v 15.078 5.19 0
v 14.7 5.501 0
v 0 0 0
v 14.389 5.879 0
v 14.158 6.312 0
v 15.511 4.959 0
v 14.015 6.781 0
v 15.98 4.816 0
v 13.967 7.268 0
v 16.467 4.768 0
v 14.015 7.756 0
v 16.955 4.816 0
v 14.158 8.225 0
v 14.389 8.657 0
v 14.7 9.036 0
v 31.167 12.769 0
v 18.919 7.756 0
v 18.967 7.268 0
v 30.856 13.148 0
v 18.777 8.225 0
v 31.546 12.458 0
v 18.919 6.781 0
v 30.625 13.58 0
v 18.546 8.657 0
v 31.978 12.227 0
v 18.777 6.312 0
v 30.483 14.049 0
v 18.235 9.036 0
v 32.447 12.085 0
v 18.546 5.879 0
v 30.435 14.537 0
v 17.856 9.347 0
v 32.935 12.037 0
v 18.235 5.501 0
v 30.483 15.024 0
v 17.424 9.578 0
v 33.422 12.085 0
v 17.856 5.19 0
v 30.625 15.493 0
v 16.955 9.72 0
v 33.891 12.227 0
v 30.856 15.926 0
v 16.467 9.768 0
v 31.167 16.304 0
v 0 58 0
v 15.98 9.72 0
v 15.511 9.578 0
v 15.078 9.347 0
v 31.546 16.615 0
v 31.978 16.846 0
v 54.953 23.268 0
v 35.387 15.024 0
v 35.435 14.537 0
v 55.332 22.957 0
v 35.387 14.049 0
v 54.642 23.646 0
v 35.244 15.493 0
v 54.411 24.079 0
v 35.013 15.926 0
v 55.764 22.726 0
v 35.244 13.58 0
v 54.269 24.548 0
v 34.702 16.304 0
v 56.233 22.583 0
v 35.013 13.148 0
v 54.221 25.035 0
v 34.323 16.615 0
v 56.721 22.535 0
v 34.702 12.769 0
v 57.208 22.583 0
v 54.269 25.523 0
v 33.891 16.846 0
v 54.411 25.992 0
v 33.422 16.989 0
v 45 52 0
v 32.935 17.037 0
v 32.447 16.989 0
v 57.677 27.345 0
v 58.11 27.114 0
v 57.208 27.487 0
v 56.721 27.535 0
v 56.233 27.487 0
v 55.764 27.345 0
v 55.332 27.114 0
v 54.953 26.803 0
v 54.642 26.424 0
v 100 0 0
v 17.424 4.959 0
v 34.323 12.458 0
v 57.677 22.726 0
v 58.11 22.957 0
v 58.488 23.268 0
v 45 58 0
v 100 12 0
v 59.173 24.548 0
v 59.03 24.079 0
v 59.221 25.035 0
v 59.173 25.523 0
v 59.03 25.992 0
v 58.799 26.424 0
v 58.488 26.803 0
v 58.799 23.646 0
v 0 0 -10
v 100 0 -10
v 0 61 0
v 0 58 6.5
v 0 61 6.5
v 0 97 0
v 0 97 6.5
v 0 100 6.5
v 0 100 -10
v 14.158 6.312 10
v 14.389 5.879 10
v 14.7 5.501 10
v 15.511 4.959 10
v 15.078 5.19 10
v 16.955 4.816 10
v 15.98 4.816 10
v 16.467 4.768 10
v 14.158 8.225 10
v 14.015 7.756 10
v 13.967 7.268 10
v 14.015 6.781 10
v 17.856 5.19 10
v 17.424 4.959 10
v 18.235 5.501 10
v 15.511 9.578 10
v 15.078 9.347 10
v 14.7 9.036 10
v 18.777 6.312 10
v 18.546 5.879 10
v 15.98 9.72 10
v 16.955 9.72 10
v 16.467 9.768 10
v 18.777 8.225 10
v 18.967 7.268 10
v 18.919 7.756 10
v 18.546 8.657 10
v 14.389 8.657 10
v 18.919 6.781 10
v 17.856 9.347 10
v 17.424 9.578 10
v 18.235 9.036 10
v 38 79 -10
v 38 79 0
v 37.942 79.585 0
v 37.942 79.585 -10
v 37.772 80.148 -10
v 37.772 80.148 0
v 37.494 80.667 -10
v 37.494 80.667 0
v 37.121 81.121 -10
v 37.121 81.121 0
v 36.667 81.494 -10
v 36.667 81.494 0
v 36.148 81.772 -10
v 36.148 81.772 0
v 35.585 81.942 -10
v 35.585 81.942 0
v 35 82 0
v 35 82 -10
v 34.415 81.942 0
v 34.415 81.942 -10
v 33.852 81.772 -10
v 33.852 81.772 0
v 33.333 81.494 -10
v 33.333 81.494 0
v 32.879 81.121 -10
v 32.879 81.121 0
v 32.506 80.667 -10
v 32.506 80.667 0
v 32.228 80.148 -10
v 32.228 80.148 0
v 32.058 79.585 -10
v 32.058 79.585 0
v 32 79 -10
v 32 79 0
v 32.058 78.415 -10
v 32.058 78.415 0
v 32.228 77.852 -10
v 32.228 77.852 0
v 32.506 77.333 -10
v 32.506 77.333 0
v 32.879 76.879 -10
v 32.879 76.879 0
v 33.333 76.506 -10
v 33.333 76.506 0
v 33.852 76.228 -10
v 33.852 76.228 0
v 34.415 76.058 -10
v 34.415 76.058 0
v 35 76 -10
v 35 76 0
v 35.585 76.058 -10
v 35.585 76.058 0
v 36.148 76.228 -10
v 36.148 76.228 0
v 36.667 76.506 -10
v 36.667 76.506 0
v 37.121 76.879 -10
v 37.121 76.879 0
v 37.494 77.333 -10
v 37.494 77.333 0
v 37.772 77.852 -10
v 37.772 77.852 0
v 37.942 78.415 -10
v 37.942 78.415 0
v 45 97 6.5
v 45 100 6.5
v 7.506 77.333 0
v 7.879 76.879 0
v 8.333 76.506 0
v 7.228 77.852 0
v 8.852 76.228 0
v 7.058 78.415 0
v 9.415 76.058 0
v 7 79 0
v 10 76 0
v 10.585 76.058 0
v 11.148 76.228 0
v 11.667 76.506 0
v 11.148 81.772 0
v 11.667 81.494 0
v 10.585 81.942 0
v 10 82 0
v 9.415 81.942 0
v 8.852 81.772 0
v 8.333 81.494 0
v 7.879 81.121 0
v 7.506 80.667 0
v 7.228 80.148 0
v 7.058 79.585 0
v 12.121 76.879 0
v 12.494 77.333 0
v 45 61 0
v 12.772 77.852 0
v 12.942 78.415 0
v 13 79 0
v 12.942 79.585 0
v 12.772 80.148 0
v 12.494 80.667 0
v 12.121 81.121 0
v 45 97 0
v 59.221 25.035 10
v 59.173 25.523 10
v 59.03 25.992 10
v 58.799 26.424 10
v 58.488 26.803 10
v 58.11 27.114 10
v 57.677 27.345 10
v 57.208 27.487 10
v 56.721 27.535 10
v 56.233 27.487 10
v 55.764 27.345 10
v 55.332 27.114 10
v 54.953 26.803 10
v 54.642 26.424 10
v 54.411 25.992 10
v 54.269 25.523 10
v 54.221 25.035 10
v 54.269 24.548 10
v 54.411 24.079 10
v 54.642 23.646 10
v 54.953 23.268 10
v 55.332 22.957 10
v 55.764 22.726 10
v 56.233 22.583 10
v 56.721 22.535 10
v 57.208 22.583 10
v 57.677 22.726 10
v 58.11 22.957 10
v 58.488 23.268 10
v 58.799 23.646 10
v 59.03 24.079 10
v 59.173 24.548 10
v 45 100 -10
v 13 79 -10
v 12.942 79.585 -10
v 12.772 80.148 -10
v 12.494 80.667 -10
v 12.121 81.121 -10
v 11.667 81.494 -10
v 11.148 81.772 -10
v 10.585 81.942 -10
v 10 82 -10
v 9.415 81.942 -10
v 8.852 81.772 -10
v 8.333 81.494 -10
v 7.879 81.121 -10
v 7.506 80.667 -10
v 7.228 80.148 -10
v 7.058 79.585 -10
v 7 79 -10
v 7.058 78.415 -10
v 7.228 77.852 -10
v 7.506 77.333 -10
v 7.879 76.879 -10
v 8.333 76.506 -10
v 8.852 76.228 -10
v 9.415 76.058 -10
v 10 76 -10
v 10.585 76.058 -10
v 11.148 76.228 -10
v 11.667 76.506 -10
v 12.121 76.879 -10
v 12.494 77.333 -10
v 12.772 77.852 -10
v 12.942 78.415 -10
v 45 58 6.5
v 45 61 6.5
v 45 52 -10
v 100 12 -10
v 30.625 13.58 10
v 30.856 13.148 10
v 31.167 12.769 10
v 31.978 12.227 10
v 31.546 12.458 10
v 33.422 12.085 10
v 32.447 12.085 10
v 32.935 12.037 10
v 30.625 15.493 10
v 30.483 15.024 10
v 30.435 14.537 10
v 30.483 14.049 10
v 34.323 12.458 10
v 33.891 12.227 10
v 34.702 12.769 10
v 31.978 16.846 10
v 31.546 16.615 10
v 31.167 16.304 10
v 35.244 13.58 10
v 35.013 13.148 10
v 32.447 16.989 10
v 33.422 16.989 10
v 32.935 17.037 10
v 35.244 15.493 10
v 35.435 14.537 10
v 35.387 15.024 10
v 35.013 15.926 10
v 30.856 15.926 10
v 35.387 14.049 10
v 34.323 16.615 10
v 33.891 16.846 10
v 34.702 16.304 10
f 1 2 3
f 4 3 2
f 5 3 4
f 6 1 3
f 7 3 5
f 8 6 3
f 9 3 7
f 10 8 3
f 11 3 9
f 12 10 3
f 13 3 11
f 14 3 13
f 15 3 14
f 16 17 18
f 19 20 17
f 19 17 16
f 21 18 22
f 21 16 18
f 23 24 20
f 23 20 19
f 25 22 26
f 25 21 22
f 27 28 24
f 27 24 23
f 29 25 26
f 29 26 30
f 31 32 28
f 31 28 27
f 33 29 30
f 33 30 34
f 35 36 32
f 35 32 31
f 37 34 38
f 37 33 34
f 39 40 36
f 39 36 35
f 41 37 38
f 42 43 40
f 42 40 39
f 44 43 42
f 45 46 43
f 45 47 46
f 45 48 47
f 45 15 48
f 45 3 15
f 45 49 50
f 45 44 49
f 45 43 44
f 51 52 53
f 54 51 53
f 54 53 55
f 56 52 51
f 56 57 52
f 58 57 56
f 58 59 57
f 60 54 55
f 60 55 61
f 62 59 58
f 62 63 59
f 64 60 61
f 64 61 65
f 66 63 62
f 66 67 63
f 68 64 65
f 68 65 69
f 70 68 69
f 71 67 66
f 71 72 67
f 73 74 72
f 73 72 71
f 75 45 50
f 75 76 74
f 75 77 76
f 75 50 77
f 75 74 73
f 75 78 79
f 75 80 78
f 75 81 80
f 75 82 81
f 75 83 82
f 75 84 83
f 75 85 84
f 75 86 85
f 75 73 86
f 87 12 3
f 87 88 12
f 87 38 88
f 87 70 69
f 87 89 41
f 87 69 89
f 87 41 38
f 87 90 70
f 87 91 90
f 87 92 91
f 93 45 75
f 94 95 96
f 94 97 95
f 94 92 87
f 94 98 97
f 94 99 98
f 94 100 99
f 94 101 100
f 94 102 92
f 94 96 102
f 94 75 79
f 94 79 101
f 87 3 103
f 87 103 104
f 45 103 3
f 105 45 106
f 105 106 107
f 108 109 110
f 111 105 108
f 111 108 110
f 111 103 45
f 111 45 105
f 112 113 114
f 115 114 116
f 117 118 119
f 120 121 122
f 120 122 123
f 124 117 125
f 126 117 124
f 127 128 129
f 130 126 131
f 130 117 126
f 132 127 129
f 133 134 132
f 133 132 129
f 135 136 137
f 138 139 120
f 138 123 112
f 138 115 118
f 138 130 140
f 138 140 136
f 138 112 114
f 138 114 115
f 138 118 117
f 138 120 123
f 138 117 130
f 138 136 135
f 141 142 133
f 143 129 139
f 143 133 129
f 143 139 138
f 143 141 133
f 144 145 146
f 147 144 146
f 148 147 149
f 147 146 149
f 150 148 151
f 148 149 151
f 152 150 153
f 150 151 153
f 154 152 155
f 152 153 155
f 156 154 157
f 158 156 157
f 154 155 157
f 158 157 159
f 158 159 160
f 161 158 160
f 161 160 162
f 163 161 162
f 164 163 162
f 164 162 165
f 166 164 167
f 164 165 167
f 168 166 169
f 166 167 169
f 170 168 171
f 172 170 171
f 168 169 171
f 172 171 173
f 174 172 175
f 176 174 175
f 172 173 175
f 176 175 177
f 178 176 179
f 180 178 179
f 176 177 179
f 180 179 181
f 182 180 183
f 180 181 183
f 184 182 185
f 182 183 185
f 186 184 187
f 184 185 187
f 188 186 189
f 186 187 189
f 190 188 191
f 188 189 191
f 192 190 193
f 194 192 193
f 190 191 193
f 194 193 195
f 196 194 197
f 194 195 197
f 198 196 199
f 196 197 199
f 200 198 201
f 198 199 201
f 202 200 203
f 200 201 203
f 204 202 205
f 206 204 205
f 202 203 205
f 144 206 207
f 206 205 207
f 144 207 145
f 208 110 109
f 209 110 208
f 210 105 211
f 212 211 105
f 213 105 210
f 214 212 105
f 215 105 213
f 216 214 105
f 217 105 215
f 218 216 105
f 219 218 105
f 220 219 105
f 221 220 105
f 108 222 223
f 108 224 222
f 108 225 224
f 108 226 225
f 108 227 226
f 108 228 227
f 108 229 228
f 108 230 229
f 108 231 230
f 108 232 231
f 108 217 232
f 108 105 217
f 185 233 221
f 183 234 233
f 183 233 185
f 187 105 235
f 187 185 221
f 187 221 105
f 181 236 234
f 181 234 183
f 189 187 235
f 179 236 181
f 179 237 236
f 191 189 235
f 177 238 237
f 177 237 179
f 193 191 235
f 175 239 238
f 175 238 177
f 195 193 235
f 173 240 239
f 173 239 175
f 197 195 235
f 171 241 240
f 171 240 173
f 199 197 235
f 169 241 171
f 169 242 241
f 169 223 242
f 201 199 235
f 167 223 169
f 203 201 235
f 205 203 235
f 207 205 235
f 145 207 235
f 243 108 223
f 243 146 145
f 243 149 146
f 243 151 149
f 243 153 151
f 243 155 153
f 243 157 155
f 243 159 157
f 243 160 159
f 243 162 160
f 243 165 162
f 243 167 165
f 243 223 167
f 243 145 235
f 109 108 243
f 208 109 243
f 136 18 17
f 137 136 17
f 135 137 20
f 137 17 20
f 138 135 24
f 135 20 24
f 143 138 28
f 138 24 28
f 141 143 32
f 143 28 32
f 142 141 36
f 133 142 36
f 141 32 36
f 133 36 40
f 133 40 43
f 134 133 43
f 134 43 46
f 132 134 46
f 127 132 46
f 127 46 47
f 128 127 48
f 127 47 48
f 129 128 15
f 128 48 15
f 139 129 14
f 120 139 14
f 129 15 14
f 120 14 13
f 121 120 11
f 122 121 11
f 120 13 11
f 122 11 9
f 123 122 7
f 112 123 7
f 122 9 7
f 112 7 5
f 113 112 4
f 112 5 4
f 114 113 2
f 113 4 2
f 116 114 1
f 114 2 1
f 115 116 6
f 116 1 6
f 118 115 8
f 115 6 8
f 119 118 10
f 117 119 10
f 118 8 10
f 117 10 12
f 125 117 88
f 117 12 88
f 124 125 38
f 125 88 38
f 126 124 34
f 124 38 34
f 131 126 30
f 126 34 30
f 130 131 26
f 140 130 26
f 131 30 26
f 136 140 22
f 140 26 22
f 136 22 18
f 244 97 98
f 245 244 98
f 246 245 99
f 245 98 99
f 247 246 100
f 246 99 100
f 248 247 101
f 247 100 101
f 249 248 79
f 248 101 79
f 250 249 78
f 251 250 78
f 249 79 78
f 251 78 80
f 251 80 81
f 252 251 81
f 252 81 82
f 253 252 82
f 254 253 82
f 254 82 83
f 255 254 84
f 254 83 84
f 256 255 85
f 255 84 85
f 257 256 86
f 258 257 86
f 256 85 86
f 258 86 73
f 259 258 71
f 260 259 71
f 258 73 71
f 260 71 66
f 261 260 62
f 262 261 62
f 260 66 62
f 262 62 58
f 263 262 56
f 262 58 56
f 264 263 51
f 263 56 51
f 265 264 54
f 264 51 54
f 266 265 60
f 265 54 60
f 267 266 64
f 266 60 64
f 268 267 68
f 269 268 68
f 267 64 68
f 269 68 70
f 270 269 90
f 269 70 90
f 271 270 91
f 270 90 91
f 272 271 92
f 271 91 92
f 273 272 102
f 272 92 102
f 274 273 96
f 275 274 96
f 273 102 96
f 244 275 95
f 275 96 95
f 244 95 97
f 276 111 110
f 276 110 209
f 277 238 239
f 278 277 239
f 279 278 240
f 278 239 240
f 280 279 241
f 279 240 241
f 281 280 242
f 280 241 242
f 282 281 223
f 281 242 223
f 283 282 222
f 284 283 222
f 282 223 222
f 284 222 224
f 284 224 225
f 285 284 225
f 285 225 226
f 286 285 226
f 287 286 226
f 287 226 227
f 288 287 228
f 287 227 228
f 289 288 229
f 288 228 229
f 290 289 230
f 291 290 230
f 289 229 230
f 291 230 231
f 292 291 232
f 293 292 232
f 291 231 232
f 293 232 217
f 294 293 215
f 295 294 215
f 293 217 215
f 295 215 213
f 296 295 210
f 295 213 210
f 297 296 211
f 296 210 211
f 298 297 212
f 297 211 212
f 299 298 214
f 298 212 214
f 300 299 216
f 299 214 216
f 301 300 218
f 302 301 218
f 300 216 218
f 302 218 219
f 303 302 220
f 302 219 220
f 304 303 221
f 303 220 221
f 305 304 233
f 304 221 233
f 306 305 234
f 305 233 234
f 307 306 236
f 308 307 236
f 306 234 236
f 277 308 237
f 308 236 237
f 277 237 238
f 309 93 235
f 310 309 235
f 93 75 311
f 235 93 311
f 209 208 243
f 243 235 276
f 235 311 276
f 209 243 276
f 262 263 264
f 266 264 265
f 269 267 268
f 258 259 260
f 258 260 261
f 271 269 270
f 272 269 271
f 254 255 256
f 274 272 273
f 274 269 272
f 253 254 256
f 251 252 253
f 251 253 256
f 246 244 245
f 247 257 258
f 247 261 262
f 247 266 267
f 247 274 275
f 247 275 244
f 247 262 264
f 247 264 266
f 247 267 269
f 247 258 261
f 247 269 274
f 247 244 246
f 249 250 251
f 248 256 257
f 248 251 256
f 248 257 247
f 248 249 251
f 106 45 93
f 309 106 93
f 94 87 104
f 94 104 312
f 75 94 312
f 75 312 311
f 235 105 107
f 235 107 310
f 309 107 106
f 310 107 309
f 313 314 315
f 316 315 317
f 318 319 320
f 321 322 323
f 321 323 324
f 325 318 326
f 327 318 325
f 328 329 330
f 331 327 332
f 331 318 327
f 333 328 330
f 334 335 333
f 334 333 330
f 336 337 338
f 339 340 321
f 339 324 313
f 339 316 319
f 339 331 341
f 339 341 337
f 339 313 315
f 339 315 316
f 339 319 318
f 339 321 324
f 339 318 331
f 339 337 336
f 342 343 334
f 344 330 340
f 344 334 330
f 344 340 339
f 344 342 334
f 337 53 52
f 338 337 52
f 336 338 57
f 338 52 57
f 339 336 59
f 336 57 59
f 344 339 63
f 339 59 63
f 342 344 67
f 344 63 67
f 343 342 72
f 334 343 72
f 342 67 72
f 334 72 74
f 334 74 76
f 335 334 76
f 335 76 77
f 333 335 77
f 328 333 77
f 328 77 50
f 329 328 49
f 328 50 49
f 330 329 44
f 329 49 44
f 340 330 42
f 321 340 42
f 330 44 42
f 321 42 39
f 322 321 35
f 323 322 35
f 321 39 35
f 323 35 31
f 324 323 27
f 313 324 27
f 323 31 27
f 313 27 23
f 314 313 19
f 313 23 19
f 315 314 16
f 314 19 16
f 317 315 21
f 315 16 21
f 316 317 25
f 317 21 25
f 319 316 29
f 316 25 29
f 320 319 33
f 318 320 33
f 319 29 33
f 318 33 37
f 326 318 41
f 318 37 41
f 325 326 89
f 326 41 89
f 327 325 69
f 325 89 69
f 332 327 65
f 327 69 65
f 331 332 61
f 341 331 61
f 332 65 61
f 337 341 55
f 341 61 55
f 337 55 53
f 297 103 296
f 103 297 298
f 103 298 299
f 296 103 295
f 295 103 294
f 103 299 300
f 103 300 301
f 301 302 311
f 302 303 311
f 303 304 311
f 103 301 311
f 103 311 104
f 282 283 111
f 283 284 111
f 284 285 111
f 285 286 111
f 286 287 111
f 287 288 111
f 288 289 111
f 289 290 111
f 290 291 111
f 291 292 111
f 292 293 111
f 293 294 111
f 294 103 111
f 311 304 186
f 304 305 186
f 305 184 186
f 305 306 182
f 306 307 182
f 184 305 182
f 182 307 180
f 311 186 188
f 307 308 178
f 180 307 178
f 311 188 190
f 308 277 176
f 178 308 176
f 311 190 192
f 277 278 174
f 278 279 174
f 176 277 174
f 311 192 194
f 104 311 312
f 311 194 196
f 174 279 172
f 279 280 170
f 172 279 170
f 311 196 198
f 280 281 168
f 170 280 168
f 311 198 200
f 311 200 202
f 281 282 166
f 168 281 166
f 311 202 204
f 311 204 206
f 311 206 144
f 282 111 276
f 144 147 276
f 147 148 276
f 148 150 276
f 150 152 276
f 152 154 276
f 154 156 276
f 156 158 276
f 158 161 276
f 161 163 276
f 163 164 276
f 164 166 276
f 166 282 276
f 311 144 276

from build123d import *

# Parameters (mm, degrees)
BOSS_EXTRUDE1_DEPTH = 10
SKETCH3_W           = 45
SKETCH3_H           = 3
BOSS_EXTRUDE2_DEPTH = 6.5
SKETCH4_R           = 3
CUT_EXTRUDE2_DEPTH  = 10
SKETCH5_R           = 2.5
BOSS_EXTRUDE3_DEPTH = 10


with BuildPart() as part:
    # Sketch2 → Boss-Extrude1 (new body)
    with BuildSketch(Plane.XY):
        Polygon((0, 0), (100, 0), (100, 12), (45, 52), (45, 100), (0, 100), align=None)
    extrude(amount=-BOSS_EXTRUDE1_DEPTH)

    # Sketch3 → Boss-Extrude2 (add)
    with BuildSketch(Plane.XY):
        with Locations((22.5, 98.5)):
            Rectangle(SKETCH3_W, SKETCH3_H)
        with Locations((22.5, 59.5)):
            Rectangle(SKETCH3_W, SKETCH3_H)
    extrude(amount=BOSS_EXTRUDE2_DEPTH)

    # Sketch4 → Cut-Extrude2 (cut)
    with BuildSketch(Plane.XY):
        with Locations((10, 79)):
            Circle(SKETCH4_R)
        with Locations((35, 79)):
            Circle(SKETCH4_R)
    extrude(amount=-CUT_EXTRUDE2_DEPTH, mode=Mode.SUBTRACT)

    # Sketch5 → Boss-Extrude3 (add)
    with BuildSketch(Plane.XY):
        with Locations((16.467286656, 7.268319627)):
            Circle(SKETCH5_R)
        with Locations((32.934573311, 14.536639255)):
            Circle(SKETCH5_R)
        with Locations((56.720654036, 25.035323161)):
            Circle(SKETCH5_R)
    extrude(amount=BOSS_EXTRUDE3_DEPTH)


solid = part.part
